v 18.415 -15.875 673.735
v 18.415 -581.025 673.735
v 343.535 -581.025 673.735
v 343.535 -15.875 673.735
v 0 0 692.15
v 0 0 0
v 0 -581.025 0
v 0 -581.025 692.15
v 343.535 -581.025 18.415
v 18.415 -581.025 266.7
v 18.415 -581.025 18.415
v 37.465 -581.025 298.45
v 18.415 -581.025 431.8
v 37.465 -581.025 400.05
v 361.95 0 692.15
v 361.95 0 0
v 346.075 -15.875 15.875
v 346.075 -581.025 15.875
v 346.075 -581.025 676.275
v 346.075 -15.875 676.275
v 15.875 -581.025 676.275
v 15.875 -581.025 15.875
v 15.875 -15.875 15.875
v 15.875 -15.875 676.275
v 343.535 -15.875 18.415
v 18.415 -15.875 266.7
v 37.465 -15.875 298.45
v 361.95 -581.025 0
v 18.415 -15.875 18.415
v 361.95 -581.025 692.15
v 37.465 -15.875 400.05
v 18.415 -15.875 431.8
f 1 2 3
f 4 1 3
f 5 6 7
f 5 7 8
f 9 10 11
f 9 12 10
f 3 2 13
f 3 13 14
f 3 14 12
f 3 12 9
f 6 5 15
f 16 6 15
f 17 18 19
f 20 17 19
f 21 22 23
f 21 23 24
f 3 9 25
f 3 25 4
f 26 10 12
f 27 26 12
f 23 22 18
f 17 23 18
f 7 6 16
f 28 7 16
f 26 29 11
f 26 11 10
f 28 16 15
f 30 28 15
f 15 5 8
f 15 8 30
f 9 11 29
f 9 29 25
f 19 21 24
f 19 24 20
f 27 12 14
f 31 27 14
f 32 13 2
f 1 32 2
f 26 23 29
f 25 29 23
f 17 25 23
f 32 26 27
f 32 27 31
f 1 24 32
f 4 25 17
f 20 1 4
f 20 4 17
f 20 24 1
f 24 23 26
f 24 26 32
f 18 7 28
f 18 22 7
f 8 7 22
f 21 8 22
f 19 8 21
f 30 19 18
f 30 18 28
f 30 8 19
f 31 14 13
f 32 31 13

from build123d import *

# Parameters (mm, degrees)
F0_W     = 361.95
F0_H     = 692.15
F1_DEPTH = 581.025
F2_W     = 330.2
F2_H     = 660.4
F3_DEPTH = 565.15
F4_W     = 325.12
F4_H     = 655.32
F5_DEPTH = 565.15
F7_DEPTH = 565.15


with BuildPart() as f1:
    # F0 (on Front) → F1 (new body)
    with BuildSketch(Plane.XZ):
        with Locations((180.975, 346.075)):
            Rectangle(F0_W, F0_H)
    extrude(amount=F1_DEPTH)

    # F2 (on face) → F3 (cut)
    with BuildSketch(Plane.XZ.offset(581.025)):
        with Locations((180.975, 346.075)):
            Rectangle(F2_W, F2_H)
    extrude(amount=-F3_DEPTH, mode=Mode.SUBTRACT)

    # F4 (on face) → F5 (join)
    with BuildSketch(Plane.XZ.offset(581.025)):
        with Locations((180.975, 346.075)):
            Rectangle(F4_W, F4_H)
    extrude(amount=-F5_DEPTH)

    # F6 (on face) → F7 (cut)
    with BuildSketch(Plane.XZ.offset(581.025)):
        Polygon((37.465, 400.05), (18.415, 431.8), (18.415, 266.7), (37.465, 298.45), align=None)
    extrude(amount=-F7_DEPTH, mode=Mode.SUBTRACT)


solid = f1.part
